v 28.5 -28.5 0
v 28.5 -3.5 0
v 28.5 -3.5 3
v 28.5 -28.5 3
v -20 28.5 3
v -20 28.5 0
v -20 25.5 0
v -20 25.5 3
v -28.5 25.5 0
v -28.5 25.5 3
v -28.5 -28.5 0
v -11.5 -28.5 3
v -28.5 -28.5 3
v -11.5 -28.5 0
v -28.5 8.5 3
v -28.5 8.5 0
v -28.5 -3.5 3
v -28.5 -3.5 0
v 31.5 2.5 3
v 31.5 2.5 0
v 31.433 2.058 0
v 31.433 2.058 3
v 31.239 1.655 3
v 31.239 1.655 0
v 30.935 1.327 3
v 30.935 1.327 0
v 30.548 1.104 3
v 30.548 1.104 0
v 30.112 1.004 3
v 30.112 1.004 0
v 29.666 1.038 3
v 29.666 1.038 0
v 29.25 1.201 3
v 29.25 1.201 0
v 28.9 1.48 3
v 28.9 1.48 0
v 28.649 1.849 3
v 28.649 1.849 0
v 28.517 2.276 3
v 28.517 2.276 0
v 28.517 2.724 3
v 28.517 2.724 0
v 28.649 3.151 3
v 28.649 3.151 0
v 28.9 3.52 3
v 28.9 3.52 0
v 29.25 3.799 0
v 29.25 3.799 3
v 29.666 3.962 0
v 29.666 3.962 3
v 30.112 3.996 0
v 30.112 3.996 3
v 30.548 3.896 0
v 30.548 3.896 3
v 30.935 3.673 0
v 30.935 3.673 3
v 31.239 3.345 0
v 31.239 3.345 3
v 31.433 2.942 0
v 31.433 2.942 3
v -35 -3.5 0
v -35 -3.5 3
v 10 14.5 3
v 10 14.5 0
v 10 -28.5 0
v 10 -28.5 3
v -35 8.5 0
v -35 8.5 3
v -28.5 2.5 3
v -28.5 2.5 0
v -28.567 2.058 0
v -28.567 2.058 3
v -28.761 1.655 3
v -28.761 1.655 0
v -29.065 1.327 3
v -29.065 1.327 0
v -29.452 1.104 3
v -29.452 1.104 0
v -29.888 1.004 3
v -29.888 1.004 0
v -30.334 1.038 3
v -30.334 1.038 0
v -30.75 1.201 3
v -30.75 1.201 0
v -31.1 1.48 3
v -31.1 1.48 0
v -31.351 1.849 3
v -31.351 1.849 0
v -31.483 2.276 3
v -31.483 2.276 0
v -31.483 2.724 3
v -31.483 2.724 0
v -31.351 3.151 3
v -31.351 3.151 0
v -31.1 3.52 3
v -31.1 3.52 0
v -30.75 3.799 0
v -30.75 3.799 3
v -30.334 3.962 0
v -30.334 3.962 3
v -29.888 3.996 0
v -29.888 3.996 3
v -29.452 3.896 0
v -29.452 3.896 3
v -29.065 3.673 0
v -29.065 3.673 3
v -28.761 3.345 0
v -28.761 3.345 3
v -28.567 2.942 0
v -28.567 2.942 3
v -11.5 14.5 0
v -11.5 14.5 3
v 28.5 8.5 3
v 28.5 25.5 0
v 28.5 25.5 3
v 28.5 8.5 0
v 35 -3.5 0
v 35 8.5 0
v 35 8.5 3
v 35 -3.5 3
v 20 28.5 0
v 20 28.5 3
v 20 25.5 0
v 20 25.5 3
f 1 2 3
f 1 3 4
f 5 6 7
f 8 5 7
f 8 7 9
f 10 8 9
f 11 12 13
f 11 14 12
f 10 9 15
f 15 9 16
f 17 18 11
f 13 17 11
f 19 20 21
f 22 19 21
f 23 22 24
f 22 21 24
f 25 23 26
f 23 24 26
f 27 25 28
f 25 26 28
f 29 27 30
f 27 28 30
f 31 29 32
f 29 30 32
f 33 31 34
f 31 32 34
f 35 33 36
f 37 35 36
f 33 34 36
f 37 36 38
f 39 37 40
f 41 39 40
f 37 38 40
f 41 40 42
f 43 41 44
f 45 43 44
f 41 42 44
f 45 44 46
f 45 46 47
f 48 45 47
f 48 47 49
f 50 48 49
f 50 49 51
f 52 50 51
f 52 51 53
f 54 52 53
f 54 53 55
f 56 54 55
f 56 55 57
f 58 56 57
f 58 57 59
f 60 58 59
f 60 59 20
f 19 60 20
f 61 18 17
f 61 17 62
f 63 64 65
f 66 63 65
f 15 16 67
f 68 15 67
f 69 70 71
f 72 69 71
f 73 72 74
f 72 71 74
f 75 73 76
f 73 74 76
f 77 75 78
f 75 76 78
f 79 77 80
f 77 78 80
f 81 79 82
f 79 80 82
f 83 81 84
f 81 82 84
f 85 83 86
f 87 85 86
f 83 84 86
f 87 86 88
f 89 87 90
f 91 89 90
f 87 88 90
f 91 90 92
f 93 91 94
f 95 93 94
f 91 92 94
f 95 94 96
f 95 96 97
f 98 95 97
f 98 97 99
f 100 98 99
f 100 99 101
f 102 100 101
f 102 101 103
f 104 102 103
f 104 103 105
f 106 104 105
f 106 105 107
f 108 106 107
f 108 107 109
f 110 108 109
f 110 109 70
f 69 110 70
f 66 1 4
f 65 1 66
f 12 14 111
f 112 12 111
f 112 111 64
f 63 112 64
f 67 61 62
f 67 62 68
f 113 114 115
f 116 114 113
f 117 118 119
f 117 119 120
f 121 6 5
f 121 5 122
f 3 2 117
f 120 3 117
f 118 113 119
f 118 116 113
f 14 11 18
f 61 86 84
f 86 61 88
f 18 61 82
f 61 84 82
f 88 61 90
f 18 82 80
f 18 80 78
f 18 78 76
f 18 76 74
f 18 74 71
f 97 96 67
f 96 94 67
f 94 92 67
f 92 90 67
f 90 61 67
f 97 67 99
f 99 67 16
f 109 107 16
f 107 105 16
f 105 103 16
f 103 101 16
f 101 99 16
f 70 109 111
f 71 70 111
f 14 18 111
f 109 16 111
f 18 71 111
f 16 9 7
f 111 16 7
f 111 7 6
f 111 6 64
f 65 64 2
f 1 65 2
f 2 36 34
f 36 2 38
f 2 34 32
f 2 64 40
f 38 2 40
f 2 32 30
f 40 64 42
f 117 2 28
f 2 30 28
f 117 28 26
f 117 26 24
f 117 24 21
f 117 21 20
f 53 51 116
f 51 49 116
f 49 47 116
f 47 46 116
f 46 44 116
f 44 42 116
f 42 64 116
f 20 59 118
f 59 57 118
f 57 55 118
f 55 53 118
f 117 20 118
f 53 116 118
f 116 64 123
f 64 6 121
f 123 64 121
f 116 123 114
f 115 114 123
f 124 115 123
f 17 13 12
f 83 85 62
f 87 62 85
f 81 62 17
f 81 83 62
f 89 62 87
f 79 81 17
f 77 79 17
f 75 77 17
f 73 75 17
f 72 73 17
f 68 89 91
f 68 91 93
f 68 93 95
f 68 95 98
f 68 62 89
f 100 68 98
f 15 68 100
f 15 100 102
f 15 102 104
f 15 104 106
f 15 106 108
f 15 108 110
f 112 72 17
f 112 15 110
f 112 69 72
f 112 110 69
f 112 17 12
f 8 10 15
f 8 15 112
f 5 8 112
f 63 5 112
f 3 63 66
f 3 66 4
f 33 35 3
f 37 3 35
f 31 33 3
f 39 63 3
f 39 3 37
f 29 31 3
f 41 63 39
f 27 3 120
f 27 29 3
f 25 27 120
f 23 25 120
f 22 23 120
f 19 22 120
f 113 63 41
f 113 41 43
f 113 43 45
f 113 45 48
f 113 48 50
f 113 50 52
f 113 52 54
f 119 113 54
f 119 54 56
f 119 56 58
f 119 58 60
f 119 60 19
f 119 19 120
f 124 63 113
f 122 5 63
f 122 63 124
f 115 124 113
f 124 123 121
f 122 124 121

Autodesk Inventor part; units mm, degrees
ref_plane "YZ Plane" through (0, 0, 0) normal (1, 0, 0) x (0, 1, 0)
ref_plane "XZ Plane" through (0, 0, 0) normal (0, 1, 0) x (-1, 0, 0)
ref_plane "XY Plane" through (0, 0, 0) normal (0, 0, 1) x (1, 0, 0)
sketch "Эскиз1" plane through (0, 0, 0) normal (0, 0, 1) x (1, 0, 0)
  line L0 (31.5, -28.5) -> (-31.5, -28.5)
  line L1 (-31.5, -28.5) -> (-31.5, 28.5)
  line L2 (-31.5, 28.5) -> (31.5, 28.5)
  line L3 (31.5, 28.5) -> (31.5, -28.5)
  line L4 (31.5, -28.5) -> (-31.5, 28.5) construction
  line L5 (-31.5, -28.5) -> (31.5, 28.5) construction
  line L6 (-31.5, 28.5) -> (31.5, 28.5)
  line L7 (31.5, 28.5) -> (31.5, 25.5)
  line L8 (31.5, 25.5) -> (-31.5, 25.5)
  line L9 (-31.5, 25.5) -> (-31.5, 28.5)
  line L10 (-31.5, 28.5) -> (-28.5, 28.5)
  line L11 (-28.5, 28.5) -> (-28.5, -28.5)
  line L12 (-28.5, -28.5) -> (-31.5, -28.5)
  line L13 (-31.5, -28.5) -> (-31.5, 28.5)
  line L14 (31.5, 28.5) -> (28.5, 28.5)
  line L15 (28.5, 28.5) -> (28.5, -28.5)
  line L16 (28.5, -28.5) -> (31.5, -28.5)
  line L17 (31.5, -28.5) -> (31.5, 28.5)
  line L18 (11.5, -8.5) -> (-11.5, -8.5)
  line L19 (-11.5, -8.5) -> (-11.5, 14.5)
  line L20 (-11.5, 14.5) -> (11.5, 14.5)
  line L21 (11.5, 14.5) -> (11.5, -8.5)
  line L22 (11.5, -8.5) -> (-11.5, 14.5) construction
  line L23 (-11.5, -8.5) -> (11.5, 14.5) construction
  line L24 (-11.5, 14.5) -> (10, 14.5)
  line L25 (10, 14.5) -> (10, -28.5)
  line L26 (10, -28.5) -> (-11.5, -28.5)
  line L27 (-11.5, -28.5) -> (-11.5, 14.5)
  line L28 (-31.5, 28.5) -> (-28.5, 28.5)
  line L29 (-28.5, 28.5) -> (-28.5, 8.5)
  line L30 (-28.5, 8.5) -> (-31.5, 8.5)
  line L31 (-31.5, 8.5) -> (-31.5, 28.5)
  line L32 (-31.5, 8.5) -> (-28.5, 8.5)
  line L33 (-28.5, 8.5) -> (-28.5, -3.5)
  line L34 (-28.5, -3.5) -> (-31.5, -3.5)
  line L35 (-31.5, -3.5) -> (-31.5, 8.5)
  line L36 (0, 0) -> (0, 3)
  line L37 (28.5, 8.5) -> (31.5, 8.5)
  line L38 (28.5, -3.5) -> (31.5, -3.5)
  line L39 (-20, -22.5) -> (20, -22.5)
  line L40 (20, -22.5) -> (20, 28.5)
  line L41 (20, 28.5) -> (-20, 28.5)
  line L42 (-20, 28.5) -> (-20, -22.5)
  line L43 (-20, -22.5) -> (20, 28.5) construction
  line L44 (20, -22.5) -> (-20, 28.5) construction
  line L45 (-28.5, 2.5) -> (28.5, 2.5)
  line L46 (35, -28.5) -> (-35, -28.5)
  line L47 (-35, -28.5) -> (-35, 28.5)
  line L48 (-35, 28.5) -> (35, 28.5)
  line L49 (35, 28.5) -> (35, -28.5)
  line L50 (35, -28.5) -> (-35, 28.5) construction
  line L51 (-35, -28.5) -> (35, 28.5) construction
  line L52 (-28.5, 2.5) -> (-30, 2.5)
  circle A0 centre (-30, 2.5) radius 1.5
  circle A1 centre (30, 2.5) radius 1.5
  line L53 (-31.5, 8.5) -> (-35, 8.5)
  line L54 (-35, 8.5) -> (-35, -3.5)
  line L55 (-35, -3.5) -> (-31.5, -3.5)
  line L56 (-31.5, -3.5) -> (-31.5, 8.5)
  line L57 (31.5, -3.5) -> (35, -3.5)
  line L58 (35, -3.5) -> (35, 8.5)
  line L59 (35, 8.5) -> (31.5, 8.5)
  line L60 (31.5, 8.5) -> (31.5, -3.5)
  point P0 (-31.5, -3.5)
  point P1 (-11.5, -28.5)
  point P2 (-28.5, 25.5)
  point P3 (-31.5, 8.5)
  point P4 (-20, 25.5)
  point P5 (28.5, -3.5)
  point P6 (31.5, -3.5)
  point P7 (28.5, 8.5)
  point P8 (28.5, 25.5)
  point P9 (20, 25.5)
  point P10 (20, 28.5)
  point P11 (10, -8.5)
  dimension "d0" = 63
  dimension "d1" = 57
  dimension "d2" = 3
  dimension "d3" = 3
  dimension "d4" = 3
  dimension "d5" = 23
  dimension "d6" = 23
  dimension "d7" = 20
  dimension "d8" = 12
  dimension "d12" = 40
  dimension "d13" = 70
extrude "Выдавливание1" add sketch "Эскиз1" along normal blind 3 contours L0 L25 L39 L40 L45 L15 | L38 L15 A1 L3 | L3 L59 L49 L57 | A1 L15 L37 L3 | L0 L11 L45 L42 L39 L27 | L25 L18 L21 L45 L40 L39 | L45 L40 L8 L15 | L39 L42 L45 L19 L27 | L25 L45 L21 L18 | L45 L21 L20 L19 L42 L8 L40 | L34 L1 A0 L11 | L25 L20 L21 L45 | L8 L42 L2 L40 | L55 L47 L53 L1 | A0 L1 L30 L11 | L11 L8 L42 L45
properties part number "бок"
